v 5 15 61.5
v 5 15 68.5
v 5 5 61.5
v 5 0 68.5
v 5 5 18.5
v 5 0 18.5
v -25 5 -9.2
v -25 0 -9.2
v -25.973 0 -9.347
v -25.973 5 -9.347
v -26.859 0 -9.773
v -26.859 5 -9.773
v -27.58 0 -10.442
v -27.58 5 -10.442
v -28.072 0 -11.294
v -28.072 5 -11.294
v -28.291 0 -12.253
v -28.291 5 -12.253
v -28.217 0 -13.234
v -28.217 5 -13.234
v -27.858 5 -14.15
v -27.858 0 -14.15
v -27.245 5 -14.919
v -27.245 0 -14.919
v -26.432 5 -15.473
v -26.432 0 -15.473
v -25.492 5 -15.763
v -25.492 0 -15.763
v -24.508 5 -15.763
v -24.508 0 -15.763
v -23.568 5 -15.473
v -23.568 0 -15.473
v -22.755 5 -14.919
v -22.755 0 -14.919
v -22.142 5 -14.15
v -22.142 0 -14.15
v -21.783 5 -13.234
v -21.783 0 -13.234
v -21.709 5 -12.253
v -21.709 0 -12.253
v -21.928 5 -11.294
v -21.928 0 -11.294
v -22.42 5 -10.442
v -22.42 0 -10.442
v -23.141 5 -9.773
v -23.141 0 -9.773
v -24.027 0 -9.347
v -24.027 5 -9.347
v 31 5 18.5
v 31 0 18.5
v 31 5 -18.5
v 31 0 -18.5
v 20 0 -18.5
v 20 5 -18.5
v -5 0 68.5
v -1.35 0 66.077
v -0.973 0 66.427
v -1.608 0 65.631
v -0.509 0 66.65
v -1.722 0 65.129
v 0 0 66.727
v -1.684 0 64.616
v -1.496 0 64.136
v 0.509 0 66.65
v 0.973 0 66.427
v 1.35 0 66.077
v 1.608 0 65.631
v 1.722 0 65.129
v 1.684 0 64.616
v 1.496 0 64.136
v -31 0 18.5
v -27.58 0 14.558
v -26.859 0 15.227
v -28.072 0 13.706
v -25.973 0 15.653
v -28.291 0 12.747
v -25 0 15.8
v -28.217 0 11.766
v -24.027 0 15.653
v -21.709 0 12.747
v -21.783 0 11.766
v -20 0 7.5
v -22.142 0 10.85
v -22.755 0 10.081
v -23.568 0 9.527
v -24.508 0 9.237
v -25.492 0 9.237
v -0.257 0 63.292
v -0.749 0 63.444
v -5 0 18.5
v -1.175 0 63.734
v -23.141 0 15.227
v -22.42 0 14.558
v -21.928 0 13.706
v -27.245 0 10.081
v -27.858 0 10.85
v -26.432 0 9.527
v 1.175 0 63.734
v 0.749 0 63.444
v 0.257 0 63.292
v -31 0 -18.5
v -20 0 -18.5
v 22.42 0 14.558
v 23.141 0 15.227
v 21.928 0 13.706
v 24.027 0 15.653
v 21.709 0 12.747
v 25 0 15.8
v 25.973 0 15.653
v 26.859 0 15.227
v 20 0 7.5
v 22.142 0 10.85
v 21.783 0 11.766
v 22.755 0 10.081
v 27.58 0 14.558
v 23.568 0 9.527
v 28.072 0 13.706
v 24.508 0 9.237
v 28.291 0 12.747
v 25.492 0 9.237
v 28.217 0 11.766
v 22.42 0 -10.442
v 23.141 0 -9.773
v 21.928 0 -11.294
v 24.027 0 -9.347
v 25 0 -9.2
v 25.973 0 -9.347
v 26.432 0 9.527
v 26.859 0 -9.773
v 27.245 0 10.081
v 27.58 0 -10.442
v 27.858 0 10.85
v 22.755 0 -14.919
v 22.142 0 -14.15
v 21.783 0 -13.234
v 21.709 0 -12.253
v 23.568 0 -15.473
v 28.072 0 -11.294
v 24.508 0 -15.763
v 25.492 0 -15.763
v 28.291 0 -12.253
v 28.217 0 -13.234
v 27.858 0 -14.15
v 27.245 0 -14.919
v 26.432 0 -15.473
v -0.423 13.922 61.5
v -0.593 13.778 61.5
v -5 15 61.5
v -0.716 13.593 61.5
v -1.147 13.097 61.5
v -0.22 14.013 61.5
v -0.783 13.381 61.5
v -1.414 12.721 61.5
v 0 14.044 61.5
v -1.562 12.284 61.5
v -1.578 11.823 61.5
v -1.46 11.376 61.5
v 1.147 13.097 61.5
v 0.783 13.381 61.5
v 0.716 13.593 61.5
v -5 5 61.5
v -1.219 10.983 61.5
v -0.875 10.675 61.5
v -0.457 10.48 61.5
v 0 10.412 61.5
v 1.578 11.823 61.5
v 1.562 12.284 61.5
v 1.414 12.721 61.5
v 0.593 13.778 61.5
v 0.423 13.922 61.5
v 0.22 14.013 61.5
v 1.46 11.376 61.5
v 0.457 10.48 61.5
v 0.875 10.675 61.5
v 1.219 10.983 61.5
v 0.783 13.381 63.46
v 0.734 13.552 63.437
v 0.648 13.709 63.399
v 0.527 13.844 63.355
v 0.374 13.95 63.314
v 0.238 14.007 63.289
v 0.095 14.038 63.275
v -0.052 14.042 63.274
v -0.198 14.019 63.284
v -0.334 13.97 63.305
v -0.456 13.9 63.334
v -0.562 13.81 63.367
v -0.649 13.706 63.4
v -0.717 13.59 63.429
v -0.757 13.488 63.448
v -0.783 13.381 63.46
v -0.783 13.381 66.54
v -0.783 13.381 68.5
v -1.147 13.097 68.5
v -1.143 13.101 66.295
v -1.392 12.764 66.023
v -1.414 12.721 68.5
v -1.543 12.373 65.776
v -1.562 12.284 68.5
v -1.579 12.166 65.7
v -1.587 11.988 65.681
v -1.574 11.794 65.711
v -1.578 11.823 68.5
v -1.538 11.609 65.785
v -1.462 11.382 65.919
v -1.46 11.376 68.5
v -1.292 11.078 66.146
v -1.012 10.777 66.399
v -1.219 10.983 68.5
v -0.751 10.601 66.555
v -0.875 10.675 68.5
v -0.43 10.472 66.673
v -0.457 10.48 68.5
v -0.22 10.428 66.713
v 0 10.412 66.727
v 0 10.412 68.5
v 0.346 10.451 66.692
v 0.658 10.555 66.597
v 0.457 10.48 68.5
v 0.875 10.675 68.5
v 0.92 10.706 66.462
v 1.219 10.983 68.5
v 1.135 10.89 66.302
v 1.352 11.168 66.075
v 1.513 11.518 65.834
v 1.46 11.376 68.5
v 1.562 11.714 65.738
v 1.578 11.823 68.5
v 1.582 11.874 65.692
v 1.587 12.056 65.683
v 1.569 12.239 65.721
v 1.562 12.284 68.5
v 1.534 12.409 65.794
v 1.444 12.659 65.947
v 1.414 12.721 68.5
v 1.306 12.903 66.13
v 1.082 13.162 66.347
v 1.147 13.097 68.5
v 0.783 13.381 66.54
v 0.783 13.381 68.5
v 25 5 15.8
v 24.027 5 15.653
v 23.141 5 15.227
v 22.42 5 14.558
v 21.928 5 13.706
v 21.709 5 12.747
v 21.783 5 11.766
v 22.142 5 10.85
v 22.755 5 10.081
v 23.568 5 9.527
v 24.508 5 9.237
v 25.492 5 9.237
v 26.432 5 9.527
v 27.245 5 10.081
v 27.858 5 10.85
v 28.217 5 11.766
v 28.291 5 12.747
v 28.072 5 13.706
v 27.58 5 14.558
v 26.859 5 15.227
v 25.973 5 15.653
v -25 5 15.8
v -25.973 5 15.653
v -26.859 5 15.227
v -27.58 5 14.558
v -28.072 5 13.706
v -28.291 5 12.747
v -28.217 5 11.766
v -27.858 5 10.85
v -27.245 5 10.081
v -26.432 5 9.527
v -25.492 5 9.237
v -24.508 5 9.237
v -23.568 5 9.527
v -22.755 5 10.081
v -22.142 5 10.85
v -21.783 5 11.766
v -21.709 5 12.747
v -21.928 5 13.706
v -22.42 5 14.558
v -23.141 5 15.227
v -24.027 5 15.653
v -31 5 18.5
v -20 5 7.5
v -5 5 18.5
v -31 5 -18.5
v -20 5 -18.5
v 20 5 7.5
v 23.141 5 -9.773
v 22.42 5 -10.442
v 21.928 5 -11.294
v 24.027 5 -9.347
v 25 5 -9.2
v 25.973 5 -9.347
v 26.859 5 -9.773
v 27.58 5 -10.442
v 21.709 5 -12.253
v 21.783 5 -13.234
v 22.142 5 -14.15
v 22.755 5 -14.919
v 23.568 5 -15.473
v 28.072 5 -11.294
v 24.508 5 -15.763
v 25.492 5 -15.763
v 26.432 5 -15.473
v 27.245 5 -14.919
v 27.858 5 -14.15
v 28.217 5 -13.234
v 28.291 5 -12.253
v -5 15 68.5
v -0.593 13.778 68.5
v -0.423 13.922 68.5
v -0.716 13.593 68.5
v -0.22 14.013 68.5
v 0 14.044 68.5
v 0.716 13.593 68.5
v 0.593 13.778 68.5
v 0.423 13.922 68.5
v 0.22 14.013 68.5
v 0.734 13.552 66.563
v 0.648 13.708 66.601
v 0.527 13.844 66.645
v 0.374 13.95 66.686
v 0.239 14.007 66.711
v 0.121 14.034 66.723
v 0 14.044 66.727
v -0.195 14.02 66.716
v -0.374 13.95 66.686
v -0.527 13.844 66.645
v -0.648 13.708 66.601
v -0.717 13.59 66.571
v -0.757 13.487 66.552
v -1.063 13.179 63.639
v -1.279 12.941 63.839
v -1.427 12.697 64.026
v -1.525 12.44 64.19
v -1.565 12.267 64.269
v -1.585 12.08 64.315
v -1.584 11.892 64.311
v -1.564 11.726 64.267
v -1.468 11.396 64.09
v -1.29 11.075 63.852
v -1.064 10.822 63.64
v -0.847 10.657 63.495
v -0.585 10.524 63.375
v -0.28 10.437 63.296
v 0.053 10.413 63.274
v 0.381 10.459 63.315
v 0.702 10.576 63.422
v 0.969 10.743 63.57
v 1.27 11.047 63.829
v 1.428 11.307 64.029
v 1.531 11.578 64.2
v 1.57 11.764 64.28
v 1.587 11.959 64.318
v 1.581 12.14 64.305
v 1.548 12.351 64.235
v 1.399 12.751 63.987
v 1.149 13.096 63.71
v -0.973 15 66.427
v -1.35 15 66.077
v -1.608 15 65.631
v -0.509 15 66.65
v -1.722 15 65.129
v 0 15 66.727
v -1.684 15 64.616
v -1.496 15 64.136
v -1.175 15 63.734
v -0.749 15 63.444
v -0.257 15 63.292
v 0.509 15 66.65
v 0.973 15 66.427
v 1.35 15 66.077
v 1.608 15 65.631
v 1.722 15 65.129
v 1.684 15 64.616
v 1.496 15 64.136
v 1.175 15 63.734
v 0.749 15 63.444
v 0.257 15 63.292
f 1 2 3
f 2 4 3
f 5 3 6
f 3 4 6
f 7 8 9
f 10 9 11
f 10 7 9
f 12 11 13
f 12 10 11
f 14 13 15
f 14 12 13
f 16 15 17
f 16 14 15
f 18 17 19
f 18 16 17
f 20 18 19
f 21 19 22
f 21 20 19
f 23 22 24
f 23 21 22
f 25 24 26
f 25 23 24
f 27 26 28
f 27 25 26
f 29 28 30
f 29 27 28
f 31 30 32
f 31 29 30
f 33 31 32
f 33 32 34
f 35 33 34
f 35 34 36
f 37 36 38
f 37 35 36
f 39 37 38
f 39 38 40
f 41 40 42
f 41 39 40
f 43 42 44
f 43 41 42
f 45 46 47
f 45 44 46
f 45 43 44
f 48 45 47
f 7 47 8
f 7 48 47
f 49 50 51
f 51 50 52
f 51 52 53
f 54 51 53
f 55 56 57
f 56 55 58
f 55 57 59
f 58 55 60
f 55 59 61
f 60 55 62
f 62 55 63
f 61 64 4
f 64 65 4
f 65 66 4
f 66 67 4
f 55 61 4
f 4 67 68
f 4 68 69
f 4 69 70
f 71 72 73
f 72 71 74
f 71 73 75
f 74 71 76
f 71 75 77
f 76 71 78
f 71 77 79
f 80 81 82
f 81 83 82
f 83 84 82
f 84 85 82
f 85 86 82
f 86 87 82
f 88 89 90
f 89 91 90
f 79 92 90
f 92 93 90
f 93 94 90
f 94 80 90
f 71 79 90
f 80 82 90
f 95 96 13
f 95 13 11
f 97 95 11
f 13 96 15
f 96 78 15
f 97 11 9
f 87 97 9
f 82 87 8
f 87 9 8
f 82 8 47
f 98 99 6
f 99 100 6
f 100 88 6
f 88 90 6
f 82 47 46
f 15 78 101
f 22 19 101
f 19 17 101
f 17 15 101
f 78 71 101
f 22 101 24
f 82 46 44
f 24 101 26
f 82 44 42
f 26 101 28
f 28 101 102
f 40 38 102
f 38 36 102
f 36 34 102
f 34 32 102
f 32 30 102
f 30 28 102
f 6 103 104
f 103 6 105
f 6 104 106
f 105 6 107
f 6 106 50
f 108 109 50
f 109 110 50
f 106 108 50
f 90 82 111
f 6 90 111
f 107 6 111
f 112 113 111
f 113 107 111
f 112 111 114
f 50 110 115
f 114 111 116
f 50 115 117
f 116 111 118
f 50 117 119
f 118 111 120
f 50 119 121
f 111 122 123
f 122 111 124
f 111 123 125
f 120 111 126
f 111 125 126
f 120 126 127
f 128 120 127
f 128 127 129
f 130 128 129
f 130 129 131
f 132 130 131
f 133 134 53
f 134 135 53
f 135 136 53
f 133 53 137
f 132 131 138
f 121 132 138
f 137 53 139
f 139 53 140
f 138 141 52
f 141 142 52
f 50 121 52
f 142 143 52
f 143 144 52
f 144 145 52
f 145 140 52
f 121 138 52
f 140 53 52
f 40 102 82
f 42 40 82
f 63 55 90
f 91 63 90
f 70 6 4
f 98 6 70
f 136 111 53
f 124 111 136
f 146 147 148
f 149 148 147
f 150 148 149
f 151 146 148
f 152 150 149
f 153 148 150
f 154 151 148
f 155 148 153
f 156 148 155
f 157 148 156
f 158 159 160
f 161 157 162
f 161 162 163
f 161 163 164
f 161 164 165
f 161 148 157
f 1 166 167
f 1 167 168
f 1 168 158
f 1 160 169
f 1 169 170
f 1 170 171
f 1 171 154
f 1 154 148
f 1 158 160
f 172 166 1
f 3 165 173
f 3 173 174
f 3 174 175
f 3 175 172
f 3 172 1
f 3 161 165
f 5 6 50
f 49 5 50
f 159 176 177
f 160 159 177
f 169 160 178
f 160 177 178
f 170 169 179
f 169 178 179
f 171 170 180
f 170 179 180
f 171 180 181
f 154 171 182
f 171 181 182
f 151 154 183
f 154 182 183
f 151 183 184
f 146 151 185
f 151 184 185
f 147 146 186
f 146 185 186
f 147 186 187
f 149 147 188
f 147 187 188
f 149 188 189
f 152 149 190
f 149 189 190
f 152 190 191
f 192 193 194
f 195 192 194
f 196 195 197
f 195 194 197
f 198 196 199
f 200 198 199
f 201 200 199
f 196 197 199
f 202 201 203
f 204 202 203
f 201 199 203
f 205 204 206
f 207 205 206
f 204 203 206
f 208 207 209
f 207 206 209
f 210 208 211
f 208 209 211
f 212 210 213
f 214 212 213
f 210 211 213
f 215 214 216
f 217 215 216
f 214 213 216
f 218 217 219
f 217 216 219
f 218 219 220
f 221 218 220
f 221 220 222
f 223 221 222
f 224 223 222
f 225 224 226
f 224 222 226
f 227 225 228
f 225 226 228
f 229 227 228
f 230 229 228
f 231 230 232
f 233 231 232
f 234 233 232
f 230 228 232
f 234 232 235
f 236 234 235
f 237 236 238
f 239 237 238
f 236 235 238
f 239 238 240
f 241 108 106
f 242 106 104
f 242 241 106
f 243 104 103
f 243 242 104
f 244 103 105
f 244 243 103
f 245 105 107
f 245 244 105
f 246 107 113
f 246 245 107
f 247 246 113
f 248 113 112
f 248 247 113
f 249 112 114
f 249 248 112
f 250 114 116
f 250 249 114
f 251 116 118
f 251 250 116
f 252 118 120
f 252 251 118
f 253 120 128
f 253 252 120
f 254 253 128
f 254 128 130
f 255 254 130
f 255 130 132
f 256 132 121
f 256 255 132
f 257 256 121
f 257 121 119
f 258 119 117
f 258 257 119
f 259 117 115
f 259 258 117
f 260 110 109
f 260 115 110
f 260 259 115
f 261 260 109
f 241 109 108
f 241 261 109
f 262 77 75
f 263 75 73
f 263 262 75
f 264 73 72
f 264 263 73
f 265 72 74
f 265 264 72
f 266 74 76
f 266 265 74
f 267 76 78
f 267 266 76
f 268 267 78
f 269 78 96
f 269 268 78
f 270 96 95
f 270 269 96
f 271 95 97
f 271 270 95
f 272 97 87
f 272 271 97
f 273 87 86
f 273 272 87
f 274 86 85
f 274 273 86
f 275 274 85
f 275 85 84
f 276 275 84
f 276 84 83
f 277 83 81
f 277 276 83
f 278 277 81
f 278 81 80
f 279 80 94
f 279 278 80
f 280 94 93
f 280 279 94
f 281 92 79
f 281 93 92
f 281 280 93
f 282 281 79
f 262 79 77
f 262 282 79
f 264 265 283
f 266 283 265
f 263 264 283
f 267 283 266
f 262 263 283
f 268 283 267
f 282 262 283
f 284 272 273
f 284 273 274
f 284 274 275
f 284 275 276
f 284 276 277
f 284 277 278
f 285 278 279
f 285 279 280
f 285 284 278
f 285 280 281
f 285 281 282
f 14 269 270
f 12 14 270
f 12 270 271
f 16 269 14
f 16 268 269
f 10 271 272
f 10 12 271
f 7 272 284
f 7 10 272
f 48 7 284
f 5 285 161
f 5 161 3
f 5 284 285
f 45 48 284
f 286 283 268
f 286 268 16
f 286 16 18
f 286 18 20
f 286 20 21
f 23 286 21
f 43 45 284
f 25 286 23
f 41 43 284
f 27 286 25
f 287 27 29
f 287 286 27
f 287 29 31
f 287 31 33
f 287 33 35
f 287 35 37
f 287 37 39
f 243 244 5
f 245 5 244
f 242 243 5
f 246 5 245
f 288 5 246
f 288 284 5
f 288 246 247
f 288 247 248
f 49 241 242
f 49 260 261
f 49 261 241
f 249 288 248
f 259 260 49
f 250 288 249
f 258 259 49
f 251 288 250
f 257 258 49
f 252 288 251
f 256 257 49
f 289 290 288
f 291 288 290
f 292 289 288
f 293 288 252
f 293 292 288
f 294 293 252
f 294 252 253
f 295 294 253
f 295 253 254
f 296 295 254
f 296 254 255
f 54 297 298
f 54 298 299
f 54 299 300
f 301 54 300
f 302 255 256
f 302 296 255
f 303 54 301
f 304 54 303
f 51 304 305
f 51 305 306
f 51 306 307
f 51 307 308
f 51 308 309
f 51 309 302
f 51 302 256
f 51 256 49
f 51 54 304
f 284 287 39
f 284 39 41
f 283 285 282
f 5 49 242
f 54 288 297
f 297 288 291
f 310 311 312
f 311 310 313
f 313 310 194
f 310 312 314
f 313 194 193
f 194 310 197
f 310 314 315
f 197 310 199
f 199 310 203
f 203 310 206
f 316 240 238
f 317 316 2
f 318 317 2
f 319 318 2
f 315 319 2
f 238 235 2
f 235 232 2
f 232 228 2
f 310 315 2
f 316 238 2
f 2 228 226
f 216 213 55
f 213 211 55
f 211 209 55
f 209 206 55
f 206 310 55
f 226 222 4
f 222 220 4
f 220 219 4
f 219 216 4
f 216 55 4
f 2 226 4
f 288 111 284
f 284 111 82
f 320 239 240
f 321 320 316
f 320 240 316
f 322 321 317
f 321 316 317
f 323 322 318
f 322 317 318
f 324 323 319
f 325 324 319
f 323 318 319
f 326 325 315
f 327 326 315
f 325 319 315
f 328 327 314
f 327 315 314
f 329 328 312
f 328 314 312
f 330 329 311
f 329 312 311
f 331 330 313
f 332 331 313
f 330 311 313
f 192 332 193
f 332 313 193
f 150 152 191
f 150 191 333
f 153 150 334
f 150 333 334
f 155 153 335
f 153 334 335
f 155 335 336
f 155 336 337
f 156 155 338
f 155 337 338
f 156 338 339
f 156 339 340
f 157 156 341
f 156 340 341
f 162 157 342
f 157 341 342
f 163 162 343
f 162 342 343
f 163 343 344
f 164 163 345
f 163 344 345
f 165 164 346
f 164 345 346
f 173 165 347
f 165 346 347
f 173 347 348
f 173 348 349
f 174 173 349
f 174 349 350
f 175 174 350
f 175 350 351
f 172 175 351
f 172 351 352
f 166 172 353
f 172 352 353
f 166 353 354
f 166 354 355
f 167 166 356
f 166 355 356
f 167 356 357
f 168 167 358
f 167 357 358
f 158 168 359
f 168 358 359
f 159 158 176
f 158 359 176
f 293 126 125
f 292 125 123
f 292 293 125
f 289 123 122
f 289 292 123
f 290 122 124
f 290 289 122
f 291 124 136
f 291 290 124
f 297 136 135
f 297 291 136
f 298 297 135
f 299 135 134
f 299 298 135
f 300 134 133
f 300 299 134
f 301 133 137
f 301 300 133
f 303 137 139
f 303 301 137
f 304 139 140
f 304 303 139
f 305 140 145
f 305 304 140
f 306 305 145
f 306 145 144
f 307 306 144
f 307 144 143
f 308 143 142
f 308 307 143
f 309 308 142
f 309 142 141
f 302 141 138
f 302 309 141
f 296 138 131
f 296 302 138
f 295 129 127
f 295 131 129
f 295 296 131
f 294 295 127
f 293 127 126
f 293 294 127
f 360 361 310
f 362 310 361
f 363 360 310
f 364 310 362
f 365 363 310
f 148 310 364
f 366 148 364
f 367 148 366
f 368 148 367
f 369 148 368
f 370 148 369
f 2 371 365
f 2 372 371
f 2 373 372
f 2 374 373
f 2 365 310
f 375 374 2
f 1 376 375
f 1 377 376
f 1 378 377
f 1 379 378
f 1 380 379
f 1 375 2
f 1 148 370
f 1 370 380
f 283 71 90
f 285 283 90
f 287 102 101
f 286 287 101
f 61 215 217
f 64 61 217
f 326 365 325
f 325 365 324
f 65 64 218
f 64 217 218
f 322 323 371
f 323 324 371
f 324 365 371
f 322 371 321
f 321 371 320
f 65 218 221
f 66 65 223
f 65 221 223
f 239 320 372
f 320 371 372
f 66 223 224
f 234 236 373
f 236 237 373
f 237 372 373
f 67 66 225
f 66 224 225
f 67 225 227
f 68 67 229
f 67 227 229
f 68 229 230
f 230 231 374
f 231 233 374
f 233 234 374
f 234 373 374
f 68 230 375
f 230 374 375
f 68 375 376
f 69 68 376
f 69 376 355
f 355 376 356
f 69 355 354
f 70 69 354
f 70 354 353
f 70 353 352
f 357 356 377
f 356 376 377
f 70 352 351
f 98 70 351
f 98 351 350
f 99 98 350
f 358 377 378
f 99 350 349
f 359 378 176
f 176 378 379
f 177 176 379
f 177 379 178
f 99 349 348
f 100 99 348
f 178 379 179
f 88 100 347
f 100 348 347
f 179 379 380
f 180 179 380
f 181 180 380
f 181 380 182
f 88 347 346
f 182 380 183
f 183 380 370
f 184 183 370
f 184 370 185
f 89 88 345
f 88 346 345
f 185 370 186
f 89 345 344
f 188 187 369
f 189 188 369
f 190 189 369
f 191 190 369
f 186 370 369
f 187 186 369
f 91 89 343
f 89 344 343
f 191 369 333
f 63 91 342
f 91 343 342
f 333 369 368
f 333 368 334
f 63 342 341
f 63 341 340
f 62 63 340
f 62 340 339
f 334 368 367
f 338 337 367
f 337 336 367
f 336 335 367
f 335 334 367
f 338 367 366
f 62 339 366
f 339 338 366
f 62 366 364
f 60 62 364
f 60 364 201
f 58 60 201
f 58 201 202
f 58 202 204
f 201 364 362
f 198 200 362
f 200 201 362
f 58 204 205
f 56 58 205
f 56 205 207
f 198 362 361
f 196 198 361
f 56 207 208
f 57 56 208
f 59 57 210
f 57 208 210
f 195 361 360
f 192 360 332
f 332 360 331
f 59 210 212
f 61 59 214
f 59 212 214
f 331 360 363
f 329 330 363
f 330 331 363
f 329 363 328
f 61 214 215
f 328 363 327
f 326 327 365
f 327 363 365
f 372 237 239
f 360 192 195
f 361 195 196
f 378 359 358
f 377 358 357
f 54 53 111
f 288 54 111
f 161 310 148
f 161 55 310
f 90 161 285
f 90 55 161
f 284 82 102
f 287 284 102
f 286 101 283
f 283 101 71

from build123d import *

# Parameters (mm, degrees)
EXTRUDE1_DEPTH                 = 5
LPATTERN1_COUNT                = 2
LPATTERN1_PITCH                = 50
LPATTERN1_COUNT_DIR2           = 2
LPATTERN1_PITCH_DIR2           = 25
SKETCH5_W                      = 10
SKETCH5_H                      = 5
EXTRUDE2_DEPTH                 = 50
SKETCH6_W                      = 10
SKETCH6_H                      = 7
EXTRUDE3_DEPTH                 = 10
F_1_8_0_125_DIAMETER_HOLE1_D   = 3.175
F_1_16_0_0625_DIAMETER_HOLE1_D = 1.5875
F_8_32_TAPPED_HOLE1_D          = 3.4544


with BuildPart() as part:
    # Sketch1 → Extrude1 (new body)
    with BuildSketch(Plane(origin=(0, 0, 0), x_dir=(1, 0, 0), z_dir=(0, 1, 0))):
        Polygon((-20, -7.5), (-20, 18.5), (-31, 18.5), (-31, -18.5), (31, -18.5), (31, 18.5), (20, 18.5), (20, -7.5), align=None)
    extrude(amount=EXTRUDE1_DEPTH)

    # Sketch4 → M6 Clearance Hole1 (revolve, cut)
    with BuildSketch(Plane(origin=(-25, 5, -12.5), x_dir=(0, 0, 1), z_dir=(1, 0, 0))):
        Polygon((0, 0), (0, 11.982840043), (3.3, 10), (3.3, 0), align=None)
    m6_clearance_hole1 = revolve(axis=Axis((-25, 11.35, -12.5), (0, -1, 0)), mode=Mode.SUBTRACT)

    # LPattern1: M6 Clearance Hole1 2 × 2
    with Locations(*[(i * LPATTERN1_PITCH, 0, j * LPATTERN1_PITCH_DIR2) for i in range(LPATTERN1_COUNT) for j in range(LPATTERN1_COUNT_DIR2) if (i, j) != (0, 0)]):
        add(m6_clearance_hole1, mode=Mode.SUBTRACT)

    # Sketch5 → Extrude2 (add)
    with BuildSketch(Plane.XY.offset(18.5)):
        with Locations((0, 2.5)):
            Rectangle(SKETCH5_W, SKETCH5_H)
    extrude(amount=EXTRUDE2_DEPTH)

    # Sketch6 → Extrude3 (add)
    with BuildSketch(Plane(origin=(0, 5, 0), x_dir=(1, 0, 0), z_dir=(0, 1, 0))):
        with Locations((0, -65)):
            Rectangle(SKETCH6_W, SKETCH6_H)
    extrude(amount=EXTRUDE3_DEPTH)

    # 1/8 (0.125) Diameter Hole1 (through all)
    with Locations(Plane(origin=(0, 12, 61.5), x_dir=(-1, 0, 0), z_dir=(0, 0, -1))):
        with Locations((0, 0)):
            Hole(F_1_8_0_125_DIAMETER_HOLE1_D / 2)

    # 1/16 (0.0625) Diameter Hole1 (through all)
    with Locations(Plane(origin=(0, 13.25, 61.5), x_dir=(-1, 0, 0), z_dir=(0, 0, -1))):
        with Locations((0, 0)):
            Hole(F_1_16_0_0625_DIAMETER_HOLE1_D / 2)

    # #8-32 Tapped Hole1 (through all)
    with Locations(Plane(origin=(0, 0, 65), x_dir=(0, 0, -1), z_dir=(0, -1, 0))):
        with Locations((0, 0)):
            Hole(F_8_32_TAPPED_HOLE1_D / 2)


solid = part.part
